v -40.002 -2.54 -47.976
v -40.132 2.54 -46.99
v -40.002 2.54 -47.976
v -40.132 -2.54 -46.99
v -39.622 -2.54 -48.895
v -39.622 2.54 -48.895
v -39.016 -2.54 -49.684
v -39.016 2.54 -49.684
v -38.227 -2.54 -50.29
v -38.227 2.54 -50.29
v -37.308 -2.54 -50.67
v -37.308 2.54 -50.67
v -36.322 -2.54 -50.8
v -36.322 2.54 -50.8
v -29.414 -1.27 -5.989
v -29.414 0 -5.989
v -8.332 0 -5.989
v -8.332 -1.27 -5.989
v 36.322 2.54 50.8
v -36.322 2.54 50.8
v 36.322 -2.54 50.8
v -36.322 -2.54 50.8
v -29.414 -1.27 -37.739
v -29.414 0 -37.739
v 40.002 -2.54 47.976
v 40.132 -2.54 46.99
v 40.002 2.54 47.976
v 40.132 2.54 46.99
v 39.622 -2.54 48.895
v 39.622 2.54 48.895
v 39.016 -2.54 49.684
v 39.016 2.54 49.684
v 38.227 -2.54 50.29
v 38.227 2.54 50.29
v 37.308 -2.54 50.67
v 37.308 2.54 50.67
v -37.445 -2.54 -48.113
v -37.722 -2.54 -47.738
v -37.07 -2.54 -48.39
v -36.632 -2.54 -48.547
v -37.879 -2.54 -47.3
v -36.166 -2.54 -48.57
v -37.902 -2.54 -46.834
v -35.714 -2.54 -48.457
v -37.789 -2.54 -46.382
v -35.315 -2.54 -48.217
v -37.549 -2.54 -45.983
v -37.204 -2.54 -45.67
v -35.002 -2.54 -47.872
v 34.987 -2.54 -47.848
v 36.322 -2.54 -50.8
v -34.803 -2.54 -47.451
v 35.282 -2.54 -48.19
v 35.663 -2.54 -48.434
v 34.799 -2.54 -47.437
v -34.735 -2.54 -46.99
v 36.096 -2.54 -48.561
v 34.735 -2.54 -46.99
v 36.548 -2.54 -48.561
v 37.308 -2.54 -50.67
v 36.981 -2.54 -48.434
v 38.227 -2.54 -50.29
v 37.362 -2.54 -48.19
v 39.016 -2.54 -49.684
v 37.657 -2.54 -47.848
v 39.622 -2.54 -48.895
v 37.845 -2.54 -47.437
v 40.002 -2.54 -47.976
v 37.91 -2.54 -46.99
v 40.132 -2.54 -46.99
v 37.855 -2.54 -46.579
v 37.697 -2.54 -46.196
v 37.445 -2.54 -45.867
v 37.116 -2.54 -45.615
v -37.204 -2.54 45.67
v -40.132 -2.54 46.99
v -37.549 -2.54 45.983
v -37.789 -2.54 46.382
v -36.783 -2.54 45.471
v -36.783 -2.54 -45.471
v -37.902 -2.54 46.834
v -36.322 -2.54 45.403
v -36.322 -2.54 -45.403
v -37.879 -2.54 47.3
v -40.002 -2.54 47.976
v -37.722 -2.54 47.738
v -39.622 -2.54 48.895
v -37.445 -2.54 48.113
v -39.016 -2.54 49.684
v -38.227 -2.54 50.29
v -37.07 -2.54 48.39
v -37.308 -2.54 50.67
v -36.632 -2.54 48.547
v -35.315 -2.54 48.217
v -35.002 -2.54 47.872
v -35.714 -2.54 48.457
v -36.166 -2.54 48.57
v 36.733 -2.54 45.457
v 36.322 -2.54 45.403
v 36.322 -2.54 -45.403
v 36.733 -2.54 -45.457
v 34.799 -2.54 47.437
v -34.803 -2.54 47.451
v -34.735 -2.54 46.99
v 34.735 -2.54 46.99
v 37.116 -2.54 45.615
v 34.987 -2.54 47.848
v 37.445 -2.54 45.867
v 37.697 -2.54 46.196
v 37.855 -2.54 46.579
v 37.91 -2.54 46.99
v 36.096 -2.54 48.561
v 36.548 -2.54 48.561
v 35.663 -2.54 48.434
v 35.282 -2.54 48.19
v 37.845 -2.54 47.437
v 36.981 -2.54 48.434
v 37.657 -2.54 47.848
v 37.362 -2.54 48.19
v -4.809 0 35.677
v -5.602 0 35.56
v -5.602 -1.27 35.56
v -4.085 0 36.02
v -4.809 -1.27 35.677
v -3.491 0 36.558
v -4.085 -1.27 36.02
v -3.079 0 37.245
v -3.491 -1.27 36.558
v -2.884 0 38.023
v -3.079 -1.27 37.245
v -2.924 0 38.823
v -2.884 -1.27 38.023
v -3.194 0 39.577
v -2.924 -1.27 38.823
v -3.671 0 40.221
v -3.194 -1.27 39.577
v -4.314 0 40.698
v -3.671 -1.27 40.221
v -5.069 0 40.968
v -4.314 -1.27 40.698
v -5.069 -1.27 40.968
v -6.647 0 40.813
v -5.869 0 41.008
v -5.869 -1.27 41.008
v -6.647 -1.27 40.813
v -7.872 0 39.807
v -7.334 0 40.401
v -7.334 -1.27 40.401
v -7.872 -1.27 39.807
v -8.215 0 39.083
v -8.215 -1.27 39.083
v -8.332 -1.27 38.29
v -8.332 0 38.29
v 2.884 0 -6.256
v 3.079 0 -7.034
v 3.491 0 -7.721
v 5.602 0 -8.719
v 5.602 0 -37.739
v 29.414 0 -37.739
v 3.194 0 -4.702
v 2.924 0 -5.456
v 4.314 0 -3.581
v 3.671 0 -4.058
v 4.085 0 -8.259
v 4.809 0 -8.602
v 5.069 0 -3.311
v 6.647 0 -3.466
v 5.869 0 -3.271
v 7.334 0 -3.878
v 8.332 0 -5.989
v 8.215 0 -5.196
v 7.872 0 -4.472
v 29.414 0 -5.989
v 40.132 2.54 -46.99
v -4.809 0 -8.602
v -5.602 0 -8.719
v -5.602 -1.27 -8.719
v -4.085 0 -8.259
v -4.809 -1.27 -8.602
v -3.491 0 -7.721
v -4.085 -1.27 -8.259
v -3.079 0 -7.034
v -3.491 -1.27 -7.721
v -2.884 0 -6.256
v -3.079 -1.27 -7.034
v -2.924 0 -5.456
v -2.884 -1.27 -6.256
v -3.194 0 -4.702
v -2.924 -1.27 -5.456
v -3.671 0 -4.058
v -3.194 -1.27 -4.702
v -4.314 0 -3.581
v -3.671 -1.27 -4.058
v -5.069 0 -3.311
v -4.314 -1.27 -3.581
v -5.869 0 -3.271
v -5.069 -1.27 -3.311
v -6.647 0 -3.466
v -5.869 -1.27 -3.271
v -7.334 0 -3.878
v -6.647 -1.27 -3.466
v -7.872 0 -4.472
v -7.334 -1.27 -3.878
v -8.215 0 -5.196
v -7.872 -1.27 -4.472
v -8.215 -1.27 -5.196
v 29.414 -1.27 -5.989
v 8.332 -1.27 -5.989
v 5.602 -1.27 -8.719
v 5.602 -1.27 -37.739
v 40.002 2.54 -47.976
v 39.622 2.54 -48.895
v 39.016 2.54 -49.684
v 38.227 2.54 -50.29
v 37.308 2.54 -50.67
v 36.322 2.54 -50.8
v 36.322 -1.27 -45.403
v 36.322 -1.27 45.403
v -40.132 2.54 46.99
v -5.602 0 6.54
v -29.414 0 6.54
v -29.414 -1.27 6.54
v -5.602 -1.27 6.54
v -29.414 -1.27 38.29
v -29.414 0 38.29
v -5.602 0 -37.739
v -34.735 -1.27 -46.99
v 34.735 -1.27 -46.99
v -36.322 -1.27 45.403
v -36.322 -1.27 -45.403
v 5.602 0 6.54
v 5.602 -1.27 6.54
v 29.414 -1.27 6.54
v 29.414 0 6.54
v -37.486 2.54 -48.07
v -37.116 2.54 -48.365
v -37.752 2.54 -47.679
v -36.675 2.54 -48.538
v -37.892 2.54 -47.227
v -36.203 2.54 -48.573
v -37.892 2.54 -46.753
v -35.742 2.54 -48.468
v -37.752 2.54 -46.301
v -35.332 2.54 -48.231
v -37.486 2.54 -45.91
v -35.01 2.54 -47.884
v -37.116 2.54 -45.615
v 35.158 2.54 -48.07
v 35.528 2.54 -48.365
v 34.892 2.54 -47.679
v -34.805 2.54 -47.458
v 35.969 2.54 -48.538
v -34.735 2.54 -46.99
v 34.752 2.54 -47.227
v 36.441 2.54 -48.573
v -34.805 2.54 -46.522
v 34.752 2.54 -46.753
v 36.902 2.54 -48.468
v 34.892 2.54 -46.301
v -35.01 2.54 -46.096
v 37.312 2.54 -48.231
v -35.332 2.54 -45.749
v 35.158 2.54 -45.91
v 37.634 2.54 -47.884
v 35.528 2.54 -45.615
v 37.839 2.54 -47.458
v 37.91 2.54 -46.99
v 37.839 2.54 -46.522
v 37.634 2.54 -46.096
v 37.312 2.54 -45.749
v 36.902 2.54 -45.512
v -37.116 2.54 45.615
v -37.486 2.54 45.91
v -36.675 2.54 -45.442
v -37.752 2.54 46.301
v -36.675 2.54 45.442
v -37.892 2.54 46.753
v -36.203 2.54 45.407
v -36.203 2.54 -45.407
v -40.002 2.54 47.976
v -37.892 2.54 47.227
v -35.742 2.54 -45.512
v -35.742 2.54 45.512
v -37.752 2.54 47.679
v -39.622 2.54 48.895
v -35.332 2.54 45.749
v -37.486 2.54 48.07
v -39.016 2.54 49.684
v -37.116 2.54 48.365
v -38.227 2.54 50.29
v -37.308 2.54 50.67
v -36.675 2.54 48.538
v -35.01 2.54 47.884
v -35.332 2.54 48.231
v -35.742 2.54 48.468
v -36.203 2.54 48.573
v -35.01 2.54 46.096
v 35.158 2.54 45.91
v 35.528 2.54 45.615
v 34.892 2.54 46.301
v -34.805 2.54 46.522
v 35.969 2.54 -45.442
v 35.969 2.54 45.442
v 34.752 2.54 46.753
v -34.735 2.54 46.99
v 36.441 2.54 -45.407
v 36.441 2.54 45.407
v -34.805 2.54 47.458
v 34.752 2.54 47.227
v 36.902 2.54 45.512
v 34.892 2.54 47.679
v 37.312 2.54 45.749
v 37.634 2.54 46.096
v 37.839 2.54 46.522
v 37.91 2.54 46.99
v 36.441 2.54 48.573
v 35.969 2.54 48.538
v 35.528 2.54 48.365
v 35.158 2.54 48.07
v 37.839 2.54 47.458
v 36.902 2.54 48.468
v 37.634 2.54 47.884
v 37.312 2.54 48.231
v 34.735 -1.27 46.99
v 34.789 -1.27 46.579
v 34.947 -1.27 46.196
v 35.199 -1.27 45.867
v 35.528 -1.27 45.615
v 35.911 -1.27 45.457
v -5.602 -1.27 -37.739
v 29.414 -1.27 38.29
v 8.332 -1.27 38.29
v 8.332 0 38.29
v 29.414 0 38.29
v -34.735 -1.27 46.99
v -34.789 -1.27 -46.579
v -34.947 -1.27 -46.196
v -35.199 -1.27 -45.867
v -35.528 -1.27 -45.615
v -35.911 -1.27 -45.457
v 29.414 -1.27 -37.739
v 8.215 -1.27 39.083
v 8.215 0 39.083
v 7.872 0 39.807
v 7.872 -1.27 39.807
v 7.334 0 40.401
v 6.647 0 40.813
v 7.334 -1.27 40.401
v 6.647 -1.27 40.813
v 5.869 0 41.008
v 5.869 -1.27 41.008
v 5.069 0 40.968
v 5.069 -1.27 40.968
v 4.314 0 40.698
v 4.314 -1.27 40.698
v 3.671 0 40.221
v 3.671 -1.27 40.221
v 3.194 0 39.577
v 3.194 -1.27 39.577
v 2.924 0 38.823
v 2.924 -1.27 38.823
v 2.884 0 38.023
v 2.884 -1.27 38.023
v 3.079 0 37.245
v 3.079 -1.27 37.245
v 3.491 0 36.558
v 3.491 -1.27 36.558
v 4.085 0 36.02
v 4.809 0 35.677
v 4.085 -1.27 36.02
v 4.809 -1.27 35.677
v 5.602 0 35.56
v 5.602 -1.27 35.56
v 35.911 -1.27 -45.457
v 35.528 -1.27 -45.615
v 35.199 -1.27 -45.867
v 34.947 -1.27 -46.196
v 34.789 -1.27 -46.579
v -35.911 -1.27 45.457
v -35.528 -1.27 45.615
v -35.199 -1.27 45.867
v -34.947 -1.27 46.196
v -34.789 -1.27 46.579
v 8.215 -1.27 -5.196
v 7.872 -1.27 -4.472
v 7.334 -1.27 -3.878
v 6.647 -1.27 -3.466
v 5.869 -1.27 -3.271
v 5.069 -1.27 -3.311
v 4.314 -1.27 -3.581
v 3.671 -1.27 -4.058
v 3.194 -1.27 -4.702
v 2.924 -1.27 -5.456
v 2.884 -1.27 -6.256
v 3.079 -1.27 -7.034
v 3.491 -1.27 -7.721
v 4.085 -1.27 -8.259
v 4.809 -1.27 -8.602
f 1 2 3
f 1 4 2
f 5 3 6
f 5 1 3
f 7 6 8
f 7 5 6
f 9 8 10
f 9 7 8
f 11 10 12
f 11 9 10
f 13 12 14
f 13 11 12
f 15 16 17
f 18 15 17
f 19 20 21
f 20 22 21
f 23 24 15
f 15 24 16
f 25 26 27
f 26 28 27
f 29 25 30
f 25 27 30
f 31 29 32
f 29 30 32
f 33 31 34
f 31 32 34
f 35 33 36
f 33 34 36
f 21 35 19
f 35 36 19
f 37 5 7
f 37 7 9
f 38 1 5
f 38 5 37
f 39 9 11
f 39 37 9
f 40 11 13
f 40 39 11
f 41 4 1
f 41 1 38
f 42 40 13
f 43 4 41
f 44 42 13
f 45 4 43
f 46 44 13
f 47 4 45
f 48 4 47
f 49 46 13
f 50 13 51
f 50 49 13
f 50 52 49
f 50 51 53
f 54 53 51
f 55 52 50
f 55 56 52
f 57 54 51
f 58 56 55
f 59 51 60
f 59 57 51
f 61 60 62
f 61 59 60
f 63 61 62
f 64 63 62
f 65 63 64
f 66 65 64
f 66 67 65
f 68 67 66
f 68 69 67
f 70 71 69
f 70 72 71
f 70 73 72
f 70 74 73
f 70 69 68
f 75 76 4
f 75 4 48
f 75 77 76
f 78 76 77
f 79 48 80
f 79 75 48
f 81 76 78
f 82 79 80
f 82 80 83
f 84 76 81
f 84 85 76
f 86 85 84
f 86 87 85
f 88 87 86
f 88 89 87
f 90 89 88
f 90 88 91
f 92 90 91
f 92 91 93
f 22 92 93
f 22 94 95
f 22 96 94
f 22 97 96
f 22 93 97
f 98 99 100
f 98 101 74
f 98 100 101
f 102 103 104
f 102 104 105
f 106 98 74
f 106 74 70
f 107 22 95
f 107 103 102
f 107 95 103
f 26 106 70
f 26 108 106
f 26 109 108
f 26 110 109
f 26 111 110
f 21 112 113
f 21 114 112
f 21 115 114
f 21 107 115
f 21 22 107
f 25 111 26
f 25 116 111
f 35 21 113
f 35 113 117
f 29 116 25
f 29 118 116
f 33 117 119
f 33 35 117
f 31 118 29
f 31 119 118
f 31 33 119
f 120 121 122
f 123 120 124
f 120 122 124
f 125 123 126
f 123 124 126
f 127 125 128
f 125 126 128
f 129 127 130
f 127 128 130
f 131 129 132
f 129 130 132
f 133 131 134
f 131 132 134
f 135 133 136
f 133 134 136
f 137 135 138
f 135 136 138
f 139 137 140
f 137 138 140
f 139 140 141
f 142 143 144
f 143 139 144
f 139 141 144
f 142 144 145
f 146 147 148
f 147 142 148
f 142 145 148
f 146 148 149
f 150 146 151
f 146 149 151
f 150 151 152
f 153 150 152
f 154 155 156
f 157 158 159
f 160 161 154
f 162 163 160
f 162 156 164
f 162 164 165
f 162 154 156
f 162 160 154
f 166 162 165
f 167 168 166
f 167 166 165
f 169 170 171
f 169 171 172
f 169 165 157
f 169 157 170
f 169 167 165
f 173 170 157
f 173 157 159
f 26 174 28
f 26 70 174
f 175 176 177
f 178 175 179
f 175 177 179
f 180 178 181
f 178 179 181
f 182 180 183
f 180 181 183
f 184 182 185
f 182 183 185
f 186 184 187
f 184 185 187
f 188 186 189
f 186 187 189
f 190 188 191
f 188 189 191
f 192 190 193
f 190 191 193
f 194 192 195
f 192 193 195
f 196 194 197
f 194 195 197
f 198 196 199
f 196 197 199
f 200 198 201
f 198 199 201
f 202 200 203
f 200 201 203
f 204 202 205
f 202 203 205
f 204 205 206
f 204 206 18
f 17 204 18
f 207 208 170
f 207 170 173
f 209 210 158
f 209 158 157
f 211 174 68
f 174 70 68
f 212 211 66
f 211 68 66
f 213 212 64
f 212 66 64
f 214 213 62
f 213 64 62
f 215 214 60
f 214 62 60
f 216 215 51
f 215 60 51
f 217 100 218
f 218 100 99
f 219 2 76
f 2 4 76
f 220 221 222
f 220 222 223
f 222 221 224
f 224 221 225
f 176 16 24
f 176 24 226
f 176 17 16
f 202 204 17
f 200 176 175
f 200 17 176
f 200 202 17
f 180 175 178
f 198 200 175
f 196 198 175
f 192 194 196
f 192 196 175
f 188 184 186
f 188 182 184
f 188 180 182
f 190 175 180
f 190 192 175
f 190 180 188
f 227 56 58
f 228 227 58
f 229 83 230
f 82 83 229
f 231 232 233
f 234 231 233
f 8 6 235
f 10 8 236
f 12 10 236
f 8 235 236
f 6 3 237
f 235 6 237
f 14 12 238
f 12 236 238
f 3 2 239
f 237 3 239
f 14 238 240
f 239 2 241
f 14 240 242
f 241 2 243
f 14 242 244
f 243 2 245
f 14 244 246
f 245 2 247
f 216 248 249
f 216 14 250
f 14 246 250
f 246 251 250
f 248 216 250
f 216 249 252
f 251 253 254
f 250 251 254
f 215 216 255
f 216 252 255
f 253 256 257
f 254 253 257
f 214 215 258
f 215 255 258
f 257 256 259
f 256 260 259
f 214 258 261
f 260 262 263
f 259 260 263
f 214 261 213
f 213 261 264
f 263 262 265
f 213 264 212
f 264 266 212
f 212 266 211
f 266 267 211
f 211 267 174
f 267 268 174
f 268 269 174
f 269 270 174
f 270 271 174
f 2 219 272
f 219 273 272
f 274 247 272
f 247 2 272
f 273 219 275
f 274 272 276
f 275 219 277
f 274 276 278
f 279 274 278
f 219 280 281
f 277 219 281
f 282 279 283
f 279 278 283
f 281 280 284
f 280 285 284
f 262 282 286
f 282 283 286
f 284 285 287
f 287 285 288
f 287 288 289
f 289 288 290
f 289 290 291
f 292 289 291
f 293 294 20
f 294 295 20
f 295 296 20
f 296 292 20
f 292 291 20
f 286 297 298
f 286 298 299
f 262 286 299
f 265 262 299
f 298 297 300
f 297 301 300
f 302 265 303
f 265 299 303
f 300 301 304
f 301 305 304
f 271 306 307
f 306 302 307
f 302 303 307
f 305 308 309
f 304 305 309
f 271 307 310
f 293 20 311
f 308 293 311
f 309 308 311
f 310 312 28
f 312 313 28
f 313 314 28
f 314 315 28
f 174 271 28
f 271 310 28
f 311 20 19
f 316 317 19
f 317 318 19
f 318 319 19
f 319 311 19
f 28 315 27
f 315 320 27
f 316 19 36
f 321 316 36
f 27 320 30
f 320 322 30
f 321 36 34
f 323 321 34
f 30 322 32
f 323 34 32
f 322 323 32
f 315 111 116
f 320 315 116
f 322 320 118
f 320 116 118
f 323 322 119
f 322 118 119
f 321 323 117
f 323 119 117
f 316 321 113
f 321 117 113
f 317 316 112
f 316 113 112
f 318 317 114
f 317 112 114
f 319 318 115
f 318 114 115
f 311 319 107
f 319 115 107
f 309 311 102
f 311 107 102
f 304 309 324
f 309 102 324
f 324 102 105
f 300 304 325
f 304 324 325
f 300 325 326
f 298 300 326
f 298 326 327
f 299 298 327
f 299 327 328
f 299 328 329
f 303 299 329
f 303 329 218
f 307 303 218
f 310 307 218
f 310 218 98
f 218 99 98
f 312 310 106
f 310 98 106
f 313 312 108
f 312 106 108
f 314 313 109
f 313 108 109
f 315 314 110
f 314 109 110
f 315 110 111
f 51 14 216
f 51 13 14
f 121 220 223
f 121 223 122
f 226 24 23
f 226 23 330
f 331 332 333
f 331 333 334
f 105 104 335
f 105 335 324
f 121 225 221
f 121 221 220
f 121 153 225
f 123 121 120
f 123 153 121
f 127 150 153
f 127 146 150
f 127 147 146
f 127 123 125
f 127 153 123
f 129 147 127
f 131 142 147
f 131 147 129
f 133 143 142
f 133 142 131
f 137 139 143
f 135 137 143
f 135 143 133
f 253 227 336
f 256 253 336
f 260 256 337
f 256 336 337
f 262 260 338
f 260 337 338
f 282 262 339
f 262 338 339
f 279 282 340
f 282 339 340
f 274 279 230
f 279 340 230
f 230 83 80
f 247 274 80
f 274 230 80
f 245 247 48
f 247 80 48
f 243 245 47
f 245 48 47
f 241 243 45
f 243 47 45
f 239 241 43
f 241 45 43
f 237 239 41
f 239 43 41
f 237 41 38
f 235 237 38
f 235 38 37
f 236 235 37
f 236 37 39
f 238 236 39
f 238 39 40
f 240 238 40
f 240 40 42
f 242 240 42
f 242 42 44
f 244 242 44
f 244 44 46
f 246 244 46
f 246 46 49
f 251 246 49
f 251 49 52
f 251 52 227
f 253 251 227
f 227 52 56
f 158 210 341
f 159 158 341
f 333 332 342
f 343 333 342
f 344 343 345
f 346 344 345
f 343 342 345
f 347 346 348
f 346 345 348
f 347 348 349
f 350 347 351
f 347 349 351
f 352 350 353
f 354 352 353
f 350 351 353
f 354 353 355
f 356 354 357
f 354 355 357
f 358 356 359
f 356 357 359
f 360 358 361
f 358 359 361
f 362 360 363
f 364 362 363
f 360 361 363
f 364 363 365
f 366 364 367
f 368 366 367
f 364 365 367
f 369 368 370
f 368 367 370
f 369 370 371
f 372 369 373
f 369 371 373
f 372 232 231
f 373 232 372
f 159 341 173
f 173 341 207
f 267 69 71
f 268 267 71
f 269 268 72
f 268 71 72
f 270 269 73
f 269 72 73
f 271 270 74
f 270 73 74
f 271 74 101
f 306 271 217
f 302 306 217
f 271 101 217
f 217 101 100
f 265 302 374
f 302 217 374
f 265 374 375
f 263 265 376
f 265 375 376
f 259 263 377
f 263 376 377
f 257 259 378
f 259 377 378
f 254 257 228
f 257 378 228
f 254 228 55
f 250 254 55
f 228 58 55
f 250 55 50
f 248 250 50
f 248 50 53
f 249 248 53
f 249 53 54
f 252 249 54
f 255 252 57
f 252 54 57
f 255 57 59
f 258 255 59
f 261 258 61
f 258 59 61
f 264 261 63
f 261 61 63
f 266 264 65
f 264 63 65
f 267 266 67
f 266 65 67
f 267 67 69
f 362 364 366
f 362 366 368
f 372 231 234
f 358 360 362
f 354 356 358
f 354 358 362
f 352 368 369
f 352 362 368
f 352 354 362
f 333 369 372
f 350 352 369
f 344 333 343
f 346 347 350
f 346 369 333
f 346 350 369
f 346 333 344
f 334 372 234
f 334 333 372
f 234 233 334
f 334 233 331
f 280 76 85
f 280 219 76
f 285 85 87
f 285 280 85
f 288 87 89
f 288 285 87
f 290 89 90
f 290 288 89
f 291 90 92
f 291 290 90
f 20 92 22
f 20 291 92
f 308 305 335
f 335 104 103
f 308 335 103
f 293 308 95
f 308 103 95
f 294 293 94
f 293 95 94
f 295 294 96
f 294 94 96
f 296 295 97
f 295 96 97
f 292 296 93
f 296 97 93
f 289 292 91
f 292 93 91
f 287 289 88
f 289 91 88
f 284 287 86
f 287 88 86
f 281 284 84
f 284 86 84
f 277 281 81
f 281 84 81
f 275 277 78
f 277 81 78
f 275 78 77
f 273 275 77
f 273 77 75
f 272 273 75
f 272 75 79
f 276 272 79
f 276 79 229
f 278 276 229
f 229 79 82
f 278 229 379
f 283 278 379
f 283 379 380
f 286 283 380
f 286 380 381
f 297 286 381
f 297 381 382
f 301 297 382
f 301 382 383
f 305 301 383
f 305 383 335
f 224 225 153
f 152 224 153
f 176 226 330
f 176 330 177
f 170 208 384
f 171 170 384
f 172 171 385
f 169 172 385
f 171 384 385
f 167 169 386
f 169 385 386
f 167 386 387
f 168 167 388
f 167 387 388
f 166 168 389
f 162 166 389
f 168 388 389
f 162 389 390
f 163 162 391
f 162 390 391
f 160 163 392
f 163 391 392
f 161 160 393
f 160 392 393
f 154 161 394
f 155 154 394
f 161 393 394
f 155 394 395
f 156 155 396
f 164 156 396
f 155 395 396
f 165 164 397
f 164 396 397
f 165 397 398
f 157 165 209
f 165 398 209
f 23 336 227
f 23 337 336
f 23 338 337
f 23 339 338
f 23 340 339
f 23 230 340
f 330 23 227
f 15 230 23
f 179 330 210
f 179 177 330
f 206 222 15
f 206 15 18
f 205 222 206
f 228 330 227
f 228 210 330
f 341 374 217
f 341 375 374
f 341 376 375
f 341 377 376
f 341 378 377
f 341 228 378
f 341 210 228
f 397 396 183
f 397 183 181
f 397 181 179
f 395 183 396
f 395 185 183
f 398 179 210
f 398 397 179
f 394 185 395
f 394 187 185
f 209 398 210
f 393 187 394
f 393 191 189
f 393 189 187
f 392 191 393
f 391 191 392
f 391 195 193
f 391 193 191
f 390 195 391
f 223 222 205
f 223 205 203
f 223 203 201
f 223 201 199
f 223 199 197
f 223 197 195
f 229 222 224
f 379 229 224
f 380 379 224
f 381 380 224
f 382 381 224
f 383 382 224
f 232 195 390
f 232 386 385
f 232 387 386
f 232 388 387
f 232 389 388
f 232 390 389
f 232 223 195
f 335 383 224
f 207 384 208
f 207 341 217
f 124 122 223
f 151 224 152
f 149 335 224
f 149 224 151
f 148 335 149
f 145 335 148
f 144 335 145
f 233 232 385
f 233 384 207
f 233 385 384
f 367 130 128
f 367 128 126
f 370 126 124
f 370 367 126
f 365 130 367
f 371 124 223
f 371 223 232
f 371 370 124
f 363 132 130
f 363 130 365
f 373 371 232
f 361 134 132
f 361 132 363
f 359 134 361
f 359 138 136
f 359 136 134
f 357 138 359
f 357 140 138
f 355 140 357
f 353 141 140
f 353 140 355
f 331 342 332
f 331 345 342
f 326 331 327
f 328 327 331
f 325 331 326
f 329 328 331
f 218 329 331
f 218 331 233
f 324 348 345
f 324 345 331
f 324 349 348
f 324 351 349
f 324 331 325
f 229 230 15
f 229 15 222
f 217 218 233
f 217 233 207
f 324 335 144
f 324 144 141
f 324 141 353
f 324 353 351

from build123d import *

# Parameters (mm, degrees)
F0_W      = 80.264
F0_H      = 101.6
F1_DEPTH  = 2.54
F2_R      = 3.81
F3_W      = 72.644
F3_H      = 93.98
F4_DEPTH  = 1.27
F5_W      = 23.8125
F5_H      = 31.75
F6_DEPTH  = 1.27
F7_W      = 23.8125
F7_H      = 31.75
F8_DEPTH  = 1.27
F9_R      = 2.7305
F10_DEPTH = 1.27
F12_D     = 3.175
F12_DEPTH = 9.525
F12_TIP   = 0.9538662327


with BuildPart() as f1:
    # F0 (on Front) → F1 (new body, symmetric)
    with BuildSketch(Plane.XZ):
        Rectangle(F0_W, F0_H)
    extrude(amount=F1_DEPTH, both=True)

    # F2
    f2_edges = [f1.edges().sort_by_distance(p)[0] for p in [
        (-40.132, 0, 50.8),
        (40.132, 0, 50.8),
        (40.132, 0, -50.8),
        (-40.132, 0, -50.8),
    ]]
    fillet(f2_edges, radius=F2_R)

    # F3 (on face) → F4 (cut)
    with BuildSketch(Plane.XZ.offset(2.54)):
        Rectangle(F3_W, F3_H)
    extrude(amount=-F4_DEPTH, mode=Mode.SUBTRACT)

    # F5 (on face) → F6 (cut, symmetric)
    with BuildSketch(Plane.XZ.offset(1.27)):
        with Locations((-17.5078902394, 22.415274836)):
            Rectangle(F5_W, F5_H)
        with Locations((17.5078902394, 22.415274836)):
            Rectangle(F5_W, F5_H)
    extrude(amount=F6_DEPTH, both=True, mode=Mode.SUBTRACT)

    # F7 (on face) → F8 (cut, symmetric)
    with BuildSketch(Plane.XZ.offset(1.27)):
        with Locations((-17.5078902394, -21.8638093457)):
            Rectangle(F7_W, F7_H)
        with Locations((17.5078902394, -21.8638093457)):
            Rectangle(F7_W, F7_H)
    extrude(amount=F8_DEPTH, both=True, mode=Mode.SUBTRACT)

    # F9 (on face) → F10 (cut)
    with BuildSketch(Plane.XZ.offset(1.27)):
        with Locations((-5.6016402394, 38.290274836)):
            Circle(F9_R)
        with Locations((-5.6016402394, -5.9888093457)):
            Circle(F9_R)
        with Locations((5.6016402394, 38.290274836)):
            Circle(F9_R)
        with Locations((5.6016402394, -5.9888093457)):
            Circle(F9_R)
    extrude(amount=-F10_DEPTH, mode=Mode.SUBTRACT)

    # F12
    with Locations(Plane(origin=(0, 2.54, 0), x_dir=(-1, 0, 0), z_dir=(0, 1, 0))):
        with Locations((-36.322, 46.99), (36.322, 46.99), (36.322, -46.99), (-36.322, -46.99)):
            Hole(F12_D / 2, depth=F12_DEPTH)
            with Locations((0, 0, -(F12_DEPTH + F12_TIP / 2))):  # 118° drill point
                Cone(0, F12_D / 2, F12_TIP, mode=Mode.SUBTRACT)


solid = f1.part
